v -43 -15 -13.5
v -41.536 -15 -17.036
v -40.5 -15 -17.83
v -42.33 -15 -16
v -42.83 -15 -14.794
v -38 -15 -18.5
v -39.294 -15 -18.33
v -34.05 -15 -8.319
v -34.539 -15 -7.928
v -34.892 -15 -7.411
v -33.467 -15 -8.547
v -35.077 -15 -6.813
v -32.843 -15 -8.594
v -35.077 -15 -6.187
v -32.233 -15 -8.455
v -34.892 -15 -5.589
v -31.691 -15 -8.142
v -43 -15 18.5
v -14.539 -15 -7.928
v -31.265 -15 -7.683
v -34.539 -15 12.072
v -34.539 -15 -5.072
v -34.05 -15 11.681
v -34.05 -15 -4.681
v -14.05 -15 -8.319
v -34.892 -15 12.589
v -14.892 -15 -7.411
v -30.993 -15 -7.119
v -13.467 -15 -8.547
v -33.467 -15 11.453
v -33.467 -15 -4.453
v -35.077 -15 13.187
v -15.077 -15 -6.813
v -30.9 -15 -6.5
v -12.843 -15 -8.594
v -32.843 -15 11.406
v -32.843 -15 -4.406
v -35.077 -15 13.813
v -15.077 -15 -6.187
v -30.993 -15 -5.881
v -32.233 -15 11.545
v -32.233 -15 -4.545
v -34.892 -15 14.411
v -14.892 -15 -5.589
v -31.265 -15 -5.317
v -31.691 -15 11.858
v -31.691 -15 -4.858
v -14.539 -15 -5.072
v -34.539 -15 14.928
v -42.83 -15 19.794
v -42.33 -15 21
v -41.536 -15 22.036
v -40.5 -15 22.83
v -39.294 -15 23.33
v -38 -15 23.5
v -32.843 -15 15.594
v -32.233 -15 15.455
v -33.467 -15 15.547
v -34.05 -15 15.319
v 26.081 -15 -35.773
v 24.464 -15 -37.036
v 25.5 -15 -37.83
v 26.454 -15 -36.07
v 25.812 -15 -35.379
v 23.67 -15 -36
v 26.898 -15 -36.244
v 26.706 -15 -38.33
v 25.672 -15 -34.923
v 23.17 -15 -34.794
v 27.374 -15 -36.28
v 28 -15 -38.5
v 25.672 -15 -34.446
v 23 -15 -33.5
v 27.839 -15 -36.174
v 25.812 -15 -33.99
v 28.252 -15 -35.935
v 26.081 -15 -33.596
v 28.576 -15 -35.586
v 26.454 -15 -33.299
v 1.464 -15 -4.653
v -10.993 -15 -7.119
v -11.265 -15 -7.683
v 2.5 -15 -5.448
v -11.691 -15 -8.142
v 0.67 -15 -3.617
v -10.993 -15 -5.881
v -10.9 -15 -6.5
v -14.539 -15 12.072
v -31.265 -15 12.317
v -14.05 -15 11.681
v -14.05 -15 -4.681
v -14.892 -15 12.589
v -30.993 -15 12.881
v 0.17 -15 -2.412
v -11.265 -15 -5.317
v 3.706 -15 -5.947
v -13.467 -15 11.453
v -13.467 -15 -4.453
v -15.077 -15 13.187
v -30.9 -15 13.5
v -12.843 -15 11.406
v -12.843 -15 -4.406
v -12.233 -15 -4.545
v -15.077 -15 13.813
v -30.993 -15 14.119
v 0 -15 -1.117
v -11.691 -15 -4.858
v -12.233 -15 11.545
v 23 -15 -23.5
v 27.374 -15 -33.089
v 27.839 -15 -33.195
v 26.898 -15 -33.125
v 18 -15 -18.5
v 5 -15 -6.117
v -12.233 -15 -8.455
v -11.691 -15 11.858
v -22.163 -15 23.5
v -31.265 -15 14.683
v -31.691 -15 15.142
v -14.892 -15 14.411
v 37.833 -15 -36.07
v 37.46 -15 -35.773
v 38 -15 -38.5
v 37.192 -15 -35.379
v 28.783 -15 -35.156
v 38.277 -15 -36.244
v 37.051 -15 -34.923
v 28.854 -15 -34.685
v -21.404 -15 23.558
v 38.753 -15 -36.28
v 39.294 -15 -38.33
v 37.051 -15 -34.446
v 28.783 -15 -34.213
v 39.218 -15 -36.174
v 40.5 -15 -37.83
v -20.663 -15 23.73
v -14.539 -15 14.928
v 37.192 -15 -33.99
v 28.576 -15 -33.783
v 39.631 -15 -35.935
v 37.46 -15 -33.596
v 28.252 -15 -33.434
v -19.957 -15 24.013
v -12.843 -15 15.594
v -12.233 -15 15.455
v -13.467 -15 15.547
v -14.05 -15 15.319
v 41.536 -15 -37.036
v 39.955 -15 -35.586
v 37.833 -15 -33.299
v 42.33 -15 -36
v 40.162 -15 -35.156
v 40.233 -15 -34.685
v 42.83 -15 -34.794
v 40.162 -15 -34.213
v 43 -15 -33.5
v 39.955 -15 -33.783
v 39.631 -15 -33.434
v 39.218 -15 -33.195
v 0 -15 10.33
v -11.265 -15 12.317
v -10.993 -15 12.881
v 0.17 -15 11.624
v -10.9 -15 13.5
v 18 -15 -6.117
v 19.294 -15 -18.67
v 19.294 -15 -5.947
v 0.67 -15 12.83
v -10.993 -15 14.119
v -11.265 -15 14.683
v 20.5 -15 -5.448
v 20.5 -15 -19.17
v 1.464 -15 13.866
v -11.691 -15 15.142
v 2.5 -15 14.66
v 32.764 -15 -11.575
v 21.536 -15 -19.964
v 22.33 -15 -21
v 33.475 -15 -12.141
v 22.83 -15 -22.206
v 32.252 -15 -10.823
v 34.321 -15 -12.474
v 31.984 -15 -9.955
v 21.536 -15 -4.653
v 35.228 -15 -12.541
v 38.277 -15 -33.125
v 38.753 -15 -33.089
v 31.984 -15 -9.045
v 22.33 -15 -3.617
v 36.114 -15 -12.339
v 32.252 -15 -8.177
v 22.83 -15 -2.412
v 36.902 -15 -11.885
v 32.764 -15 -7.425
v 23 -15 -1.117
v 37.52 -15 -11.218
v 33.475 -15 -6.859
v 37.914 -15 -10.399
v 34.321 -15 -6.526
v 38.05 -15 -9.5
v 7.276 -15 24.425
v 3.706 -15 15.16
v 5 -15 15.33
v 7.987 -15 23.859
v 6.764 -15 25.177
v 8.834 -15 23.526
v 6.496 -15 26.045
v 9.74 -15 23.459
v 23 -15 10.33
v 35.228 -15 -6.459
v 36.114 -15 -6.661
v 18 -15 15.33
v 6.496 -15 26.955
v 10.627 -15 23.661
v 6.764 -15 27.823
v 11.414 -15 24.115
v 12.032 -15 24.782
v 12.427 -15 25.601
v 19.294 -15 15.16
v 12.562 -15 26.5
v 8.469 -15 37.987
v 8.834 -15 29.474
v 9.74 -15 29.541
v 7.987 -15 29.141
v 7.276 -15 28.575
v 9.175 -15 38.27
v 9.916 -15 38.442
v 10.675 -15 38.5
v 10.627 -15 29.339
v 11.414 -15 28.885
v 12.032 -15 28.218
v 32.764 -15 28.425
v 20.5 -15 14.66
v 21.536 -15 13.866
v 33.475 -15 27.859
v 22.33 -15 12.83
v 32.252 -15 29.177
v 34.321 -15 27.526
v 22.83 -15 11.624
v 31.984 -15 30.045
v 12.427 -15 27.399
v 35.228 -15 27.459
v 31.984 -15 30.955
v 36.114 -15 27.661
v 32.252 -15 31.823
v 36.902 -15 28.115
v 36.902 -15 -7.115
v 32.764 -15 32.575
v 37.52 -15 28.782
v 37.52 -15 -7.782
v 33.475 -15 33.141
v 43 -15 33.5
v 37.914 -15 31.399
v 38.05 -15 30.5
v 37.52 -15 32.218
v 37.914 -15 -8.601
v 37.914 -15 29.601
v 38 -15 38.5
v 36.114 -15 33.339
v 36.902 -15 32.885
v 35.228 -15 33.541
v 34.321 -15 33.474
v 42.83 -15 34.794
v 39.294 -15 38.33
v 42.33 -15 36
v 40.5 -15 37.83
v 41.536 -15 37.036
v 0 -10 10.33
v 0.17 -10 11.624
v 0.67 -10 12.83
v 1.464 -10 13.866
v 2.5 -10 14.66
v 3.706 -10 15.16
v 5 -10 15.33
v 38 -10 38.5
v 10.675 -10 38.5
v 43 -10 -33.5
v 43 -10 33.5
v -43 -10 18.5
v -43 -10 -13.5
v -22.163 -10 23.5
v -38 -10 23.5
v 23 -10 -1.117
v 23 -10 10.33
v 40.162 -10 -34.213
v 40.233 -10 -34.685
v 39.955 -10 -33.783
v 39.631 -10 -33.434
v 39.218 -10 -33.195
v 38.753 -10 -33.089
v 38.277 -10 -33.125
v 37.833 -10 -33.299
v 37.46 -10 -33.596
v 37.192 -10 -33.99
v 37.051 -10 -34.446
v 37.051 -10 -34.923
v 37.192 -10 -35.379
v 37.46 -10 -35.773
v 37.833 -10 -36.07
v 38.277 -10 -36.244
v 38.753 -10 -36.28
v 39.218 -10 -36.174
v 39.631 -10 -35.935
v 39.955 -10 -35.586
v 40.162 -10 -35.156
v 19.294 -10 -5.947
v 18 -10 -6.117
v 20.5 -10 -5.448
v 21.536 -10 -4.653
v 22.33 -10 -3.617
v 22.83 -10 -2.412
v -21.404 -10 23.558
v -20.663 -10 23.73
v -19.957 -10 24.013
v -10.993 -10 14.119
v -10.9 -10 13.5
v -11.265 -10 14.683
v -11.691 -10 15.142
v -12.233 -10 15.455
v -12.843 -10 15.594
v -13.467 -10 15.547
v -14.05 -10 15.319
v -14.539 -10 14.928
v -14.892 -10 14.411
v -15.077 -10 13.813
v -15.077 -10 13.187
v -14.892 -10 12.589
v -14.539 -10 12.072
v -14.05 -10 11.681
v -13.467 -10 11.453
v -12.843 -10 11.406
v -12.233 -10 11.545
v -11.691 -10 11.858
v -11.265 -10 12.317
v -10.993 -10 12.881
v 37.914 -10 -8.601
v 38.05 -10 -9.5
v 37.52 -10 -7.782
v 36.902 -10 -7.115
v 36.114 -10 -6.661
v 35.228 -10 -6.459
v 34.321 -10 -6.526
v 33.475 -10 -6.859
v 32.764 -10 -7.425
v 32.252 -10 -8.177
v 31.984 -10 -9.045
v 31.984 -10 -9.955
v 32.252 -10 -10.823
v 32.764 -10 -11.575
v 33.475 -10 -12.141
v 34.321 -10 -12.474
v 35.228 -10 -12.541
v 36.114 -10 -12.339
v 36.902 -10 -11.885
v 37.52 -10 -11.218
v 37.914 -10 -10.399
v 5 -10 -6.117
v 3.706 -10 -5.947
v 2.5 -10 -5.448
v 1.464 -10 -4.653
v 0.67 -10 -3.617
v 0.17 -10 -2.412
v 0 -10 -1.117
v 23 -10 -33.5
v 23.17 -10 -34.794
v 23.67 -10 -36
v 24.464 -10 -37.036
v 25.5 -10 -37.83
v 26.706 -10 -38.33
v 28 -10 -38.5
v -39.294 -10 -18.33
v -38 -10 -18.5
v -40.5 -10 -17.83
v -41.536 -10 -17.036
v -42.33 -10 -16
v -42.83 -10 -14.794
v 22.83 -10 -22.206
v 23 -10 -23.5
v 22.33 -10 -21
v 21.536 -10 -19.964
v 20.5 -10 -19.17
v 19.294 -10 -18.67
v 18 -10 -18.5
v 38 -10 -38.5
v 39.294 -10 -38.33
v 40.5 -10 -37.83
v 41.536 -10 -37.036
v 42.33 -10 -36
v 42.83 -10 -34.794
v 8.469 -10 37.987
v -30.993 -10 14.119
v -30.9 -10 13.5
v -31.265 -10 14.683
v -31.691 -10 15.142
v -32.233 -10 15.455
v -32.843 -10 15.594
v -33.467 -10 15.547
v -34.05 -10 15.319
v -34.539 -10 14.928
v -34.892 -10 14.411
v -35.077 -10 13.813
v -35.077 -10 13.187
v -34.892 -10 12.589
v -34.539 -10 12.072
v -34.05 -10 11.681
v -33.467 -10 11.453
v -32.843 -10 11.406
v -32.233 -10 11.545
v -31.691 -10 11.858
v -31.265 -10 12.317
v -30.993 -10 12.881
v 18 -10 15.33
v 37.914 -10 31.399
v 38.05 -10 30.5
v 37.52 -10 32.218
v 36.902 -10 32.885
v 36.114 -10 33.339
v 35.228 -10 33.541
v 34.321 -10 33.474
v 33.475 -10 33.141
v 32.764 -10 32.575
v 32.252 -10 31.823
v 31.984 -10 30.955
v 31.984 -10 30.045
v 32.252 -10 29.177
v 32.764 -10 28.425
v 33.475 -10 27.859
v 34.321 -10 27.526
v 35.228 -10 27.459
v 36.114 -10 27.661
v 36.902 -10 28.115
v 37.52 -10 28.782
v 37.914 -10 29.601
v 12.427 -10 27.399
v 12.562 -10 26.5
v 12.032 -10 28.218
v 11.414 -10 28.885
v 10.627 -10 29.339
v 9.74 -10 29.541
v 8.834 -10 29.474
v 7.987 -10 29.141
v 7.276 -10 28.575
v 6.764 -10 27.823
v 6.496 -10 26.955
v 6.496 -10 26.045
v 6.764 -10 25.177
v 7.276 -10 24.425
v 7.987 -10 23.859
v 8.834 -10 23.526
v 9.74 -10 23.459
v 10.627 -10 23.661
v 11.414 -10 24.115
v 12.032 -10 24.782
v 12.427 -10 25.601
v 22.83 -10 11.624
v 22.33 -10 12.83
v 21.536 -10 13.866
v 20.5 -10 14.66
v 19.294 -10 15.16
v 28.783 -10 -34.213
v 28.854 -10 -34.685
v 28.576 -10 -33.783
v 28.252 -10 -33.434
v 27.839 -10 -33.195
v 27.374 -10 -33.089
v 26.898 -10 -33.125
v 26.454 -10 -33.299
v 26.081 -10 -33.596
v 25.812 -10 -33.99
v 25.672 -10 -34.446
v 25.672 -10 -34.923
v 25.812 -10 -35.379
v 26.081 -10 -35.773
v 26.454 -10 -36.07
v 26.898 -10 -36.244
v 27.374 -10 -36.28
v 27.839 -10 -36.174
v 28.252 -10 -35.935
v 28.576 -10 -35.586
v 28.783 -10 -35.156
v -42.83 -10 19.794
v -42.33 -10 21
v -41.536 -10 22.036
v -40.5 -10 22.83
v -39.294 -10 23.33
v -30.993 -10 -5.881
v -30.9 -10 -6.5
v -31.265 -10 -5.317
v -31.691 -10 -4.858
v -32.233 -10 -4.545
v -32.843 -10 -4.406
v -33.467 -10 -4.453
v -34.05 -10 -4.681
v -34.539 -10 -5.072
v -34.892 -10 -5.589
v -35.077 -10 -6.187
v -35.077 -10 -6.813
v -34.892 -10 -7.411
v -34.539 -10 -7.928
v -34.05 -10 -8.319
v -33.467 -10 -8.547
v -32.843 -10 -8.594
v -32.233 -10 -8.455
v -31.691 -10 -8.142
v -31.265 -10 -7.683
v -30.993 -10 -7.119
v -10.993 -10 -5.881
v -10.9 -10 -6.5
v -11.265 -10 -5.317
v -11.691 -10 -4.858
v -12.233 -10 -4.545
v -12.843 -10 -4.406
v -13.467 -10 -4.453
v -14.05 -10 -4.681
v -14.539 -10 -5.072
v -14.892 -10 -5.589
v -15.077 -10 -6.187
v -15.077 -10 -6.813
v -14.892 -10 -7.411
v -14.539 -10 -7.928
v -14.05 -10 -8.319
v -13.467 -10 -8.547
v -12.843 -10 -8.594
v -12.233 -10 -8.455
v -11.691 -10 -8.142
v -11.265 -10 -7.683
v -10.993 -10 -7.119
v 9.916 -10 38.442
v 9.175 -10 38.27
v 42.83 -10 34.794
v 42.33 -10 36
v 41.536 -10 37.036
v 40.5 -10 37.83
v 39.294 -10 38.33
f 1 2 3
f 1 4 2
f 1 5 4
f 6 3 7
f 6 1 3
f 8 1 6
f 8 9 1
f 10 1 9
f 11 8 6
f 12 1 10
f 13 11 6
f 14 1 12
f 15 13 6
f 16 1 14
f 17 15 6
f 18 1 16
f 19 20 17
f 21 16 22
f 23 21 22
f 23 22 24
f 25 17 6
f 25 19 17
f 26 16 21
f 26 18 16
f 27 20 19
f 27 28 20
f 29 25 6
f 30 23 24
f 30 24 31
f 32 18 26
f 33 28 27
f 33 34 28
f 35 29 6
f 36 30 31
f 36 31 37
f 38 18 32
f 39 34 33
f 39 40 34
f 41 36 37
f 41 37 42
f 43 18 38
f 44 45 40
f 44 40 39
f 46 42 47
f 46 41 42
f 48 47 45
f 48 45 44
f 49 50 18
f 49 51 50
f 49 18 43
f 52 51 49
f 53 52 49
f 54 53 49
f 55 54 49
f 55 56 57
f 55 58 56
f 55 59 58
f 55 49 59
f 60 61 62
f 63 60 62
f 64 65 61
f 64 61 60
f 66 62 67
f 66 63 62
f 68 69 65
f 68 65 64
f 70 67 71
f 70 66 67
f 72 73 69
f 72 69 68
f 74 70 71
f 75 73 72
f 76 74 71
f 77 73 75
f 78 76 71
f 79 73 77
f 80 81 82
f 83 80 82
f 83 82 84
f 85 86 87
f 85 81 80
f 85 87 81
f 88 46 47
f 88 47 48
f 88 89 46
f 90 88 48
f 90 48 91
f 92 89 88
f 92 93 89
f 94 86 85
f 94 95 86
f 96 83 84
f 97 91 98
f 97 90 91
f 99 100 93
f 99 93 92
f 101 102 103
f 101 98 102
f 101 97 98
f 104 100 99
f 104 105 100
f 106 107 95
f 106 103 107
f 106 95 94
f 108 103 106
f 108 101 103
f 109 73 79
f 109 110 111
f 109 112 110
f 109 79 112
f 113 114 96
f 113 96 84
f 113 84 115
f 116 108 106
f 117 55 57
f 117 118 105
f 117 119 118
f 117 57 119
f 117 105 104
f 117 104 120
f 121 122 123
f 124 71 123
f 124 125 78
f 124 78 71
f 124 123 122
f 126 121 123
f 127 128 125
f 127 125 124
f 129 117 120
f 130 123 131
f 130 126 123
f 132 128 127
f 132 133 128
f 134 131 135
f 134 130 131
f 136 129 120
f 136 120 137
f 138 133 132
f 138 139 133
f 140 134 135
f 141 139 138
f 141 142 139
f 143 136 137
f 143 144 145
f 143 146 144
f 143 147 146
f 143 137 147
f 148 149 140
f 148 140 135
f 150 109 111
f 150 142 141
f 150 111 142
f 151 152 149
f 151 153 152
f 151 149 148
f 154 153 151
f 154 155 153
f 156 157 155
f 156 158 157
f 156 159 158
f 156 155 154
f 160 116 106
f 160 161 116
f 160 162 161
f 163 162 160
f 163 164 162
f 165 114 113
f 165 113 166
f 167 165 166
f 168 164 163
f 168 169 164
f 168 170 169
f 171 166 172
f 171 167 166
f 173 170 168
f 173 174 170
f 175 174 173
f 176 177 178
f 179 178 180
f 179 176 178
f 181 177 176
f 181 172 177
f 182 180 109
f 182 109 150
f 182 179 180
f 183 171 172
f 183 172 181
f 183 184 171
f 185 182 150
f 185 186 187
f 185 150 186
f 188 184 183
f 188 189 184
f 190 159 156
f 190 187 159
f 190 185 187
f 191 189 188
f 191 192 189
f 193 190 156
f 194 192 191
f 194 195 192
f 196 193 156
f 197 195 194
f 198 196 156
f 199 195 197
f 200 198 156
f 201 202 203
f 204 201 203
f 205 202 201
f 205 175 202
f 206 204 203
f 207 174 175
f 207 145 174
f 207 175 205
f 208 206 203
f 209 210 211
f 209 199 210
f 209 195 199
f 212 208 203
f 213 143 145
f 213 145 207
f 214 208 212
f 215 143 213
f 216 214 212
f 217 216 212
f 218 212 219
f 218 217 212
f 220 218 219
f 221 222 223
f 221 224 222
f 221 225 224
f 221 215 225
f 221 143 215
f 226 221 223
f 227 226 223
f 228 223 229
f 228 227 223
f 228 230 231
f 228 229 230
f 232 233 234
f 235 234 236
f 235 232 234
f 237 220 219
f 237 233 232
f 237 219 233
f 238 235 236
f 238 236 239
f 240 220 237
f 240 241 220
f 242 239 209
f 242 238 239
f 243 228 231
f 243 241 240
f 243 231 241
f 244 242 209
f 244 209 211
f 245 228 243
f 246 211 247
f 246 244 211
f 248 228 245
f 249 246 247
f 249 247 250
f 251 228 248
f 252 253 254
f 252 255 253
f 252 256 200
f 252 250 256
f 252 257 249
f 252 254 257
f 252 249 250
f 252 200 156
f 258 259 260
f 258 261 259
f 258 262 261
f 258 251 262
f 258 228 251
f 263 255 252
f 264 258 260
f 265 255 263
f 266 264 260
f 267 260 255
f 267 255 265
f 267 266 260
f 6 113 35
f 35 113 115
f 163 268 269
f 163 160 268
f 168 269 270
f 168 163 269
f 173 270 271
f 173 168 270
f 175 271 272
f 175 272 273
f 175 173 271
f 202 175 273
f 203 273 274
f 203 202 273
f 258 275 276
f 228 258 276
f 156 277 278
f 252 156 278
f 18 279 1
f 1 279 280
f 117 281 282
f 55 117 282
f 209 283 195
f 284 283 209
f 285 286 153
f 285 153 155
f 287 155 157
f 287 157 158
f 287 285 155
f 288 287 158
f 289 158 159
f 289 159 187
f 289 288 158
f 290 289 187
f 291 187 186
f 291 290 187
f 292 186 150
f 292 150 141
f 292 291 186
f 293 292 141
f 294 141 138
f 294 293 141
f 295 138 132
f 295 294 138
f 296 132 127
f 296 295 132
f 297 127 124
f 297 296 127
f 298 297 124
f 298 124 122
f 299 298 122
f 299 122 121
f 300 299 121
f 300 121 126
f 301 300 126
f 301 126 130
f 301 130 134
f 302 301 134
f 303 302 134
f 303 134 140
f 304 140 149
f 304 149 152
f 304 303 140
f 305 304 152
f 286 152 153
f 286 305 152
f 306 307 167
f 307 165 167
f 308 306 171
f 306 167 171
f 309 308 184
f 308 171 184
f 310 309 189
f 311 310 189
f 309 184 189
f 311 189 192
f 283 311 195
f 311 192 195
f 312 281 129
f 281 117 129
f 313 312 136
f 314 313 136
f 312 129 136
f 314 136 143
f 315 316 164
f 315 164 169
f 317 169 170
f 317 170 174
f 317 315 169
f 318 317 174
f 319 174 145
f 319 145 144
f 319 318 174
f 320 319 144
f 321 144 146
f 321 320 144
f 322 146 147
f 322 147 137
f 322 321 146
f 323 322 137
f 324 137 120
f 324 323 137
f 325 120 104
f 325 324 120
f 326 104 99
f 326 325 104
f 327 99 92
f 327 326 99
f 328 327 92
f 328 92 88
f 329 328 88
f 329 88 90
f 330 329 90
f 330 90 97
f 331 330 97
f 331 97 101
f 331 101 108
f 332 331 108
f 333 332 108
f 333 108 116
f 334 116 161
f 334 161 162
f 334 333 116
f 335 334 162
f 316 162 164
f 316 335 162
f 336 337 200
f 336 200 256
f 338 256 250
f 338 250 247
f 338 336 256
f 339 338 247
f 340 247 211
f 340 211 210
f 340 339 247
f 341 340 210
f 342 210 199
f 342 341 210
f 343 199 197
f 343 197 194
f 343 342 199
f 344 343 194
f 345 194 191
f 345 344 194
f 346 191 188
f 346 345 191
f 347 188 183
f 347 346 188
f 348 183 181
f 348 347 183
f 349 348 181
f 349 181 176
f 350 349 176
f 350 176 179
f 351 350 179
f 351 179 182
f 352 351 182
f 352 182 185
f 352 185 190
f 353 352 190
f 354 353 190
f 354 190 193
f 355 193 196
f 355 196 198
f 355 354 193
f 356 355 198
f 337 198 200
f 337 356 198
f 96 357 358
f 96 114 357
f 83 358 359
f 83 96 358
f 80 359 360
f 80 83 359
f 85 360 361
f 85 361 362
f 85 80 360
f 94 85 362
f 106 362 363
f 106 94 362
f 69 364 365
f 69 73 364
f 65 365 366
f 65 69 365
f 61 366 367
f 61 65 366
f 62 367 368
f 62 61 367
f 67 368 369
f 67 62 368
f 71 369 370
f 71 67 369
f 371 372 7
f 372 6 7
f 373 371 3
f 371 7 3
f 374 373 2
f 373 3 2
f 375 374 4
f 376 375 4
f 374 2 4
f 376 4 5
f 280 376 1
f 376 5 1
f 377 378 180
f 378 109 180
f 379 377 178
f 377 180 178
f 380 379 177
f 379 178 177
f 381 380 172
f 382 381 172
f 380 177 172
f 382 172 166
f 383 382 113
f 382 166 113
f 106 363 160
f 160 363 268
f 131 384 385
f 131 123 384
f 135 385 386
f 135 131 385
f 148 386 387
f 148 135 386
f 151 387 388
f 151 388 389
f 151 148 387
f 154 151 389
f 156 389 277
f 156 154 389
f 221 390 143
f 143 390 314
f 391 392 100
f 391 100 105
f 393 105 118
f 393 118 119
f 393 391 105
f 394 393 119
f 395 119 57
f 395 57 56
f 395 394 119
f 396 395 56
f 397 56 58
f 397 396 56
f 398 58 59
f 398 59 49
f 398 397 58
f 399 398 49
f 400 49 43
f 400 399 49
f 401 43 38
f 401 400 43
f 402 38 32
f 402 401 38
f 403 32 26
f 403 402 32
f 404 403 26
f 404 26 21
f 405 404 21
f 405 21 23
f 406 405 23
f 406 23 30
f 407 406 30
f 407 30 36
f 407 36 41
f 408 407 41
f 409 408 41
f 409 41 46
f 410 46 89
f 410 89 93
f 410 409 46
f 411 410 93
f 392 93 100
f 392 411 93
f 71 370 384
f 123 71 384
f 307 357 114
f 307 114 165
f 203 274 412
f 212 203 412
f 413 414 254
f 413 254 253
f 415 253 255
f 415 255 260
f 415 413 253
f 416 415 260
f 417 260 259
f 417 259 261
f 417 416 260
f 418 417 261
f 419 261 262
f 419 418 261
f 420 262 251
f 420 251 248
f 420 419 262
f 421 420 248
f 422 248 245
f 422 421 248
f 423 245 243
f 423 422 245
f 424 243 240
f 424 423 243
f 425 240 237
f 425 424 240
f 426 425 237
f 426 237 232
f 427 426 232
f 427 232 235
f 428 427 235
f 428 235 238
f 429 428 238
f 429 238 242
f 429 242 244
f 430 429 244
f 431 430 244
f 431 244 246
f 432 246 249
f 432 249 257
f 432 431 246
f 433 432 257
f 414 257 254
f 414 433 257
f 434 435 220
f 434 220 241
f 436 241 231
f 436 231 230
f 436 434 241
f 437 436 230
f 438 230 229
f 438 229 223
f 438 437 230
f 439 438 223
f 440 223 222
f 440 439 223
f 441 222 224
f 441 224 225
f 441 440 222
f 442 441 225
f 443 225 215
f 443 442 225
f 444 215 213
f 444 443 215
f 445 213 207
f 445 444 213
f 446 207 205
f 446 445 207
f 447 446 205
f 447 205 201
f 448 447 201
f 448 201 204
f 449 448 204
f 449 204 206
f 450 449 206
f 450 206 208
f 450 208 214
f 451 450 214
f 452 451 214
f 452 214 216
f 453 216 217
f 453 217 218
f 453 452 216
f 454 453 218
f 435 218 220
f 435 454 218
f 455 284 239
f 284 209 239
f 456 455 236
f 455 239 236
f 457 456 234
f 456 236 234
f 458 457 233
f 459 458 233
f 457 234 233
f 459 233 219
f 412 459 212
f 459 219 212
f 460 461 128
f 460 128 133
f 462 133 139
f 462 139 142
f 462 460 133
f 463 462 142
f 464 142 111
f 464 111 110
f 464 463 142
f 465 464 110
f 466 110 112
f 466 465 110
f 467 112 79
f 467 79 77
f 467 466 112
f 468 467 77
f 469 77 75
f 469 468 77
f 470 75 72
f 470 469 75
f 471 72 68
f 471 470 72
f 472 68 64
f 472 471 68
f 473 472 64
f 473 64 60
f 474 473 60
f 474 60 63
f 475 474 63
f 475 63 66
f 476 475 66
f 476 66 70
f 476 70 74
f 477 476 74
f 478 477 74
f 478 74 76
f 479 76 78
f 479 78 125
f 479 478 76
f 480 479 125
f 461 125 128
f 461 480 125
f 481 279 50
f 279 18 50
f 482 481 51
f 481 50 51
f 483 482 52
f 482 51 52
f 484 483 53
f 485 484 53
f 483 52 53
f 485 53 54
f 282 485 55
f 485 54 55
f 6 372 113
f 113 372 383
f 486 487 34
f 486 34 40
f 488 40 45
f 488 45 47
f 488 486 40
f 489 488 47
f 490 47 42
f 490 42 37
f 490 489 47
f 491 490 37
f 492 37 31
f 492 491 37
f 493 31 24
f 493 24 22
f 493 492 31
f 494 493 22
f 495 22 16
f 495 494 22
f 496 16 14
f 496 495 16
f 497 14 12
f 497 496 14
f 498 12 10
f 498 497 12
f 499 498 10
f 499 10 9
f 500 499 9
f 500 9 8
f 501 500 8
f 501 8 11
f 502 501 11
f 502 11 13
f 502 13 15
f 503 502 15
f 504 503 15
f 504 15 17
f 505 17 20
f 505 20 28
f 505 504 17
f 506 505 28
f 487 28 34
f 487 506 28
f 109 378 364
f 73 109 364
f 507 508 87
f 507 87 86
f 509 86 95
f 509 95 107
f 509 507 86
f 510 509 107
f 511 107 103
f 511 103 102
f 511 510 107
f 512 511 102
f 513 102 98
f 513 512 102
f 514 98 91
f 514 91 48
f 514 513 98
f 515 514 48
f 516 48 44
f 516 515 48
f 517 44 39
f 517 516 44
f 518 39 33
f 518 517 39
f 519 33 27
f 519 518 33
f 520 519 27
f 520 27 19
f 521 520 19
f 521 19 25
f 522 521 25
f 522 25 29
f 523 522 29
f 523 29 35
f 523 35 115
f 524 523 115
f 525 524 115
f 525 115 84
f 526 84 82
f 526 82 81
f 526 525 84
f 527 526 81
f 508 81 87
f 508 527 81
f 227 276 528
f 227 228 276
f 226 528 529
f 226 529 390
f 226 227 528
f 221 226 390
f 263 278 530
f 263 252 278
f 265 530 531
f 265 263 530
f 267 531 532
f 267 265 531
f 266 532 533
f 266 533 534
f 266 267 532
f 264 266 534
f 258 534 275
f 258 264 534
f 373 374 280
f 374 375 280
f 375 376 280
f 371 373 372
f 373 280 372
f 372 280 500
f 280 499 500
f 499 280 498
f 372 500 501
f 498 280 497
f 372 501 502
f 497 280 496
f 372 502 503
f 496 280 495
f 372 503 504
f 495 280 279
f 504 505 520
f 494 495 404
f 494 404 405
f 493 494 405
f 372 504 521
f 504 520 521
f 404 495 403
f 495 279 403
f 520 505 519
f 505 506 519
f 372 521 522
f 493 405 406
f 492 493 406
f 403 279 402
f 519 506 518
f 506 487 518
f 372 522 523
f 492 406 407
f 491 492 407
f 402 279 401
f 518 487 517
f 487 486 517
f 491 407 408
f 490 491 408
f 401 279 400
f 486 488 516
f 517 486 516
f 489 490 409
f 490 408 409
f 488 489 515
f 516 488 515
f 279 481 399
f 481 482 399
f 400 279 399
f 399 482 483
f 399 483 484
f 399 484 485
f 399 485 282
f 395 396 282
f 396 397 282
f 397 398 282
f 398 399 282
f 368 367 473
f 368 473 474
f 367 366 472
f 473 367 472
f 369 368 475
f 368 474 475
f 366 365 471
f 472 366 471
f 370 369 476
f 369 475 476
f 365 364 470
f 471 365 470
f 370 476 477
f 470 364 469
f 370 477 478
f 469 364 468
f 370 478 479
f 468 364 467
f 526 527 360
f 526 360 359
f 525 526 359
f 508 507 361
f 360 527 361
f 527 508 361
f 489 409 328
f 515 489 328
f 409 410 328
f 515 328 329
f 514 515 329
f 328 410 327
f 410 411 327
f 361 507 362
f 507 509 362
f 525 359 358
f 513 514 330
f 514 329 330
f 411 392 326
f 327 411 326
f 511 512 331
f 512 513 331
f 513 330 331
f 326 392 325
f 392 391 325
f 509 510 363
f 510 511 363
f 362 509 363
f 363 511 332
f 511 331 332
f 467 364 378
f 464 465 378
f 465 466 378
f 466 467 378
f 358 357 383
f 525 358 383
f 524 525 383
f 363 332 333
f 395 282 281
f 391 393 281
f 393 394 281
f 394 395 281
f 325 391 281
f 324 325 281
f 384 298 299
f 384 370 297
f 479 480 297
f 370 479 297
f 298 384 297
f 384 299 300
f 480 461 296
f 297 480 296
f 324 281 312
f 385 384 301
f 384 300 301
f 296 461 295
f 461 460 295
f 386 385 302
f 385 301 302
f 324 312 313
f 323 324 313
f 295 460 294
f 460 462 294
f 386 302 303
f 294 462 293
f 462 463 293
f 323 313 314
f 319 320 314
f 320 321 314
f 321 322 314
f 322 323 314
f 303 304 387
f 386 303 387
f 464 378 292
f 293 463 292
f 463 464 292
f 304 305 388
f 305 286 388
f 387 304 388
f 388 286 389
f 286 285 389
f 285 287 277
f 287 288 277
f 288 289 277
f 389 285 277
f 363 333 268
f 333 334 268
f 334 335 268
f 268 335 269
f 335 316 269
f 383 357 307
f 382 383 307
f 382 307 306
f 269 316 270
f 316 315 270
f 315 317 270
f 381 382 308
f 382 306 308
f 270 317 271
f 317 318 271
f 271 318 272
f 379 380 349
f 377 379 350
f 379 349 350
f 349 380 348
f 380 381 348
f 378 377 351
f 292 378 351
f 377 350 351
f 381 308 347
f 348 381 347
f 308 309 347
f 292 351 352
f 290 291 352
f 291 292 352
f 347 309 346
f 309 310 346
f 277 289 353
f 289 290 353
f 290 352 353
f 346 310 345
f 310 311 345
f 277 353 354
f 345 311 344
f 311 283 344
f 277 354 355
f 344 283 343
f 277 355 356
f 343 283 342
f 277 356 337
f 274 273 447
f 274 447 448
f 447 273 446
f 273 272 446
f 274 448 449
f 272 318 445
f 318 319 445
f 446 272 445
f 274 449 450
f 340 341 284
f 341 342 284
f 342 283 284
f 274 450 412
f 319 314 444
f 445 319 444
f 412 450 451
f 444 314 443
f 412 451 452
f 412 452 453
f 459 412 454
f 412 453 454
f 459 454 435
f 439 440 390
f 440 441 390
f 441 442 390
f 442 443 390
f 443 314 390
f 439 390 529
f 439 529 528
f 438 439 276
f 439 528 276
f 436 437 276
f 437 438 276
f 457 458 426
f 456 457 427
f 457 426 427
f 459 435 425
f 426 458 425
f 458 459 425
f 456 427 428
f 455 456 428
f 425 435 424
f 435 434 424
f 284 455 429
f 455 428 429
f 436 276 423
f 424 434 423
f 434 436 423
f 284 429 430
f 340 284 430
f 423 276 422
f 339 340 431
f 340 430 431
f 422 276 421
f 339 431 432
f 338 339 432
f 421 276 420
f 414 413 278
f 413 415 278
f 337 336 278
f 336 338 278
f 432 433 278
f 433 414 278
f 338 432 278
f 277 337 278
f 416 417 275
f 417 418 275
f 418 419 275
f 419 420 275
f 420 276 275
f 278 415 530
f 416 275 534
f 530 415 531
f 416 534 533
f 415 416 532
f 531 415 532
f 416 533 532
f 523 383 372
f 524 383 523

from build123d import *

# Parameters (mm, degrees)
F1_R     = 2.1
F1_R_2   = 1.6
F1_R_3   = 3.05
F1_W     = 23
F1_H     = 21.447819
F2_DEPTH = 5
F3_R     = 5


with BuildPart() as f2:
    # F1 (on offset) → F2 (new body)
    with BuildSketch(Plane.XZ.offset(10)):
        Polygon((23, -18.5), (23, -38.5), (43, -38.5), (43, 38.5), (9.512293, 38.5), (-21, 23.5), (-43, 23.5), (-43, -18.5), align=None)
        with Locations((-33, -6.5)):
            Circle(F1_R, mode=Mode.SUBTRACT)
        with Locations((-13, -6.5)):
            Circle(F1_R, mode=Mode.SUBTRACT)
        with Locations((27.253961, -34.684543)):
            Circle(F1_R_2, mode=Mode.SUBTRACT)
        with Locations((38.63319, -34.684543)):
            Circle(F1_R_2, mode=Mode.SUBTRACT)
        with Locations((35, -9.5)):
            Circle(F1_R_3, mode=Mode.SUBTRACT)
        with Locations((-33, 13.5)):
            Circle(F1_R, mode=Mode.SUBTRACT)
        with Locations((-13, 13.5)):
            Circle(F1_R, mode=Mode.SUBTRACT)
        with Locations((11.5, 4.606424)):
            Rectangle(F1_W, F1_H, mode=Mode.SUBTRACT)
        with Locations((9.512293, 26.5)):
            Circle(F1_R_3, mode=Mode.SUBTRACT)
        with Locations((35, 30.5)):
            Circle(F1_R_3, mode=Mode.SUBTRACT)
    extrude(amount=F2_DEPTH)

    # F3
    f3_edges = [f2.edges().sort_by_distance(p)[0] for p in [
        (-43, -12.5, -18.5),
        (-43, -12.5, 23.5),
        (0, -12.5, -6.117485),
        (0, -12.5, 15.330334),
        (23, -12.5, 15.330334),
        (23, -12.5, -6.117485),
        (23, -12.5, -18.5),
        (23, -12.5, -38.5),
        (43, -12.5, -38.5),
        (43, -12.5, 38.5),
        (-21, -12.5, 23.5),
        (9.512293, -12.5, 38.5),
    ]]
    fillet(f3_edges, radius=F3_R)


solid = f2.part
